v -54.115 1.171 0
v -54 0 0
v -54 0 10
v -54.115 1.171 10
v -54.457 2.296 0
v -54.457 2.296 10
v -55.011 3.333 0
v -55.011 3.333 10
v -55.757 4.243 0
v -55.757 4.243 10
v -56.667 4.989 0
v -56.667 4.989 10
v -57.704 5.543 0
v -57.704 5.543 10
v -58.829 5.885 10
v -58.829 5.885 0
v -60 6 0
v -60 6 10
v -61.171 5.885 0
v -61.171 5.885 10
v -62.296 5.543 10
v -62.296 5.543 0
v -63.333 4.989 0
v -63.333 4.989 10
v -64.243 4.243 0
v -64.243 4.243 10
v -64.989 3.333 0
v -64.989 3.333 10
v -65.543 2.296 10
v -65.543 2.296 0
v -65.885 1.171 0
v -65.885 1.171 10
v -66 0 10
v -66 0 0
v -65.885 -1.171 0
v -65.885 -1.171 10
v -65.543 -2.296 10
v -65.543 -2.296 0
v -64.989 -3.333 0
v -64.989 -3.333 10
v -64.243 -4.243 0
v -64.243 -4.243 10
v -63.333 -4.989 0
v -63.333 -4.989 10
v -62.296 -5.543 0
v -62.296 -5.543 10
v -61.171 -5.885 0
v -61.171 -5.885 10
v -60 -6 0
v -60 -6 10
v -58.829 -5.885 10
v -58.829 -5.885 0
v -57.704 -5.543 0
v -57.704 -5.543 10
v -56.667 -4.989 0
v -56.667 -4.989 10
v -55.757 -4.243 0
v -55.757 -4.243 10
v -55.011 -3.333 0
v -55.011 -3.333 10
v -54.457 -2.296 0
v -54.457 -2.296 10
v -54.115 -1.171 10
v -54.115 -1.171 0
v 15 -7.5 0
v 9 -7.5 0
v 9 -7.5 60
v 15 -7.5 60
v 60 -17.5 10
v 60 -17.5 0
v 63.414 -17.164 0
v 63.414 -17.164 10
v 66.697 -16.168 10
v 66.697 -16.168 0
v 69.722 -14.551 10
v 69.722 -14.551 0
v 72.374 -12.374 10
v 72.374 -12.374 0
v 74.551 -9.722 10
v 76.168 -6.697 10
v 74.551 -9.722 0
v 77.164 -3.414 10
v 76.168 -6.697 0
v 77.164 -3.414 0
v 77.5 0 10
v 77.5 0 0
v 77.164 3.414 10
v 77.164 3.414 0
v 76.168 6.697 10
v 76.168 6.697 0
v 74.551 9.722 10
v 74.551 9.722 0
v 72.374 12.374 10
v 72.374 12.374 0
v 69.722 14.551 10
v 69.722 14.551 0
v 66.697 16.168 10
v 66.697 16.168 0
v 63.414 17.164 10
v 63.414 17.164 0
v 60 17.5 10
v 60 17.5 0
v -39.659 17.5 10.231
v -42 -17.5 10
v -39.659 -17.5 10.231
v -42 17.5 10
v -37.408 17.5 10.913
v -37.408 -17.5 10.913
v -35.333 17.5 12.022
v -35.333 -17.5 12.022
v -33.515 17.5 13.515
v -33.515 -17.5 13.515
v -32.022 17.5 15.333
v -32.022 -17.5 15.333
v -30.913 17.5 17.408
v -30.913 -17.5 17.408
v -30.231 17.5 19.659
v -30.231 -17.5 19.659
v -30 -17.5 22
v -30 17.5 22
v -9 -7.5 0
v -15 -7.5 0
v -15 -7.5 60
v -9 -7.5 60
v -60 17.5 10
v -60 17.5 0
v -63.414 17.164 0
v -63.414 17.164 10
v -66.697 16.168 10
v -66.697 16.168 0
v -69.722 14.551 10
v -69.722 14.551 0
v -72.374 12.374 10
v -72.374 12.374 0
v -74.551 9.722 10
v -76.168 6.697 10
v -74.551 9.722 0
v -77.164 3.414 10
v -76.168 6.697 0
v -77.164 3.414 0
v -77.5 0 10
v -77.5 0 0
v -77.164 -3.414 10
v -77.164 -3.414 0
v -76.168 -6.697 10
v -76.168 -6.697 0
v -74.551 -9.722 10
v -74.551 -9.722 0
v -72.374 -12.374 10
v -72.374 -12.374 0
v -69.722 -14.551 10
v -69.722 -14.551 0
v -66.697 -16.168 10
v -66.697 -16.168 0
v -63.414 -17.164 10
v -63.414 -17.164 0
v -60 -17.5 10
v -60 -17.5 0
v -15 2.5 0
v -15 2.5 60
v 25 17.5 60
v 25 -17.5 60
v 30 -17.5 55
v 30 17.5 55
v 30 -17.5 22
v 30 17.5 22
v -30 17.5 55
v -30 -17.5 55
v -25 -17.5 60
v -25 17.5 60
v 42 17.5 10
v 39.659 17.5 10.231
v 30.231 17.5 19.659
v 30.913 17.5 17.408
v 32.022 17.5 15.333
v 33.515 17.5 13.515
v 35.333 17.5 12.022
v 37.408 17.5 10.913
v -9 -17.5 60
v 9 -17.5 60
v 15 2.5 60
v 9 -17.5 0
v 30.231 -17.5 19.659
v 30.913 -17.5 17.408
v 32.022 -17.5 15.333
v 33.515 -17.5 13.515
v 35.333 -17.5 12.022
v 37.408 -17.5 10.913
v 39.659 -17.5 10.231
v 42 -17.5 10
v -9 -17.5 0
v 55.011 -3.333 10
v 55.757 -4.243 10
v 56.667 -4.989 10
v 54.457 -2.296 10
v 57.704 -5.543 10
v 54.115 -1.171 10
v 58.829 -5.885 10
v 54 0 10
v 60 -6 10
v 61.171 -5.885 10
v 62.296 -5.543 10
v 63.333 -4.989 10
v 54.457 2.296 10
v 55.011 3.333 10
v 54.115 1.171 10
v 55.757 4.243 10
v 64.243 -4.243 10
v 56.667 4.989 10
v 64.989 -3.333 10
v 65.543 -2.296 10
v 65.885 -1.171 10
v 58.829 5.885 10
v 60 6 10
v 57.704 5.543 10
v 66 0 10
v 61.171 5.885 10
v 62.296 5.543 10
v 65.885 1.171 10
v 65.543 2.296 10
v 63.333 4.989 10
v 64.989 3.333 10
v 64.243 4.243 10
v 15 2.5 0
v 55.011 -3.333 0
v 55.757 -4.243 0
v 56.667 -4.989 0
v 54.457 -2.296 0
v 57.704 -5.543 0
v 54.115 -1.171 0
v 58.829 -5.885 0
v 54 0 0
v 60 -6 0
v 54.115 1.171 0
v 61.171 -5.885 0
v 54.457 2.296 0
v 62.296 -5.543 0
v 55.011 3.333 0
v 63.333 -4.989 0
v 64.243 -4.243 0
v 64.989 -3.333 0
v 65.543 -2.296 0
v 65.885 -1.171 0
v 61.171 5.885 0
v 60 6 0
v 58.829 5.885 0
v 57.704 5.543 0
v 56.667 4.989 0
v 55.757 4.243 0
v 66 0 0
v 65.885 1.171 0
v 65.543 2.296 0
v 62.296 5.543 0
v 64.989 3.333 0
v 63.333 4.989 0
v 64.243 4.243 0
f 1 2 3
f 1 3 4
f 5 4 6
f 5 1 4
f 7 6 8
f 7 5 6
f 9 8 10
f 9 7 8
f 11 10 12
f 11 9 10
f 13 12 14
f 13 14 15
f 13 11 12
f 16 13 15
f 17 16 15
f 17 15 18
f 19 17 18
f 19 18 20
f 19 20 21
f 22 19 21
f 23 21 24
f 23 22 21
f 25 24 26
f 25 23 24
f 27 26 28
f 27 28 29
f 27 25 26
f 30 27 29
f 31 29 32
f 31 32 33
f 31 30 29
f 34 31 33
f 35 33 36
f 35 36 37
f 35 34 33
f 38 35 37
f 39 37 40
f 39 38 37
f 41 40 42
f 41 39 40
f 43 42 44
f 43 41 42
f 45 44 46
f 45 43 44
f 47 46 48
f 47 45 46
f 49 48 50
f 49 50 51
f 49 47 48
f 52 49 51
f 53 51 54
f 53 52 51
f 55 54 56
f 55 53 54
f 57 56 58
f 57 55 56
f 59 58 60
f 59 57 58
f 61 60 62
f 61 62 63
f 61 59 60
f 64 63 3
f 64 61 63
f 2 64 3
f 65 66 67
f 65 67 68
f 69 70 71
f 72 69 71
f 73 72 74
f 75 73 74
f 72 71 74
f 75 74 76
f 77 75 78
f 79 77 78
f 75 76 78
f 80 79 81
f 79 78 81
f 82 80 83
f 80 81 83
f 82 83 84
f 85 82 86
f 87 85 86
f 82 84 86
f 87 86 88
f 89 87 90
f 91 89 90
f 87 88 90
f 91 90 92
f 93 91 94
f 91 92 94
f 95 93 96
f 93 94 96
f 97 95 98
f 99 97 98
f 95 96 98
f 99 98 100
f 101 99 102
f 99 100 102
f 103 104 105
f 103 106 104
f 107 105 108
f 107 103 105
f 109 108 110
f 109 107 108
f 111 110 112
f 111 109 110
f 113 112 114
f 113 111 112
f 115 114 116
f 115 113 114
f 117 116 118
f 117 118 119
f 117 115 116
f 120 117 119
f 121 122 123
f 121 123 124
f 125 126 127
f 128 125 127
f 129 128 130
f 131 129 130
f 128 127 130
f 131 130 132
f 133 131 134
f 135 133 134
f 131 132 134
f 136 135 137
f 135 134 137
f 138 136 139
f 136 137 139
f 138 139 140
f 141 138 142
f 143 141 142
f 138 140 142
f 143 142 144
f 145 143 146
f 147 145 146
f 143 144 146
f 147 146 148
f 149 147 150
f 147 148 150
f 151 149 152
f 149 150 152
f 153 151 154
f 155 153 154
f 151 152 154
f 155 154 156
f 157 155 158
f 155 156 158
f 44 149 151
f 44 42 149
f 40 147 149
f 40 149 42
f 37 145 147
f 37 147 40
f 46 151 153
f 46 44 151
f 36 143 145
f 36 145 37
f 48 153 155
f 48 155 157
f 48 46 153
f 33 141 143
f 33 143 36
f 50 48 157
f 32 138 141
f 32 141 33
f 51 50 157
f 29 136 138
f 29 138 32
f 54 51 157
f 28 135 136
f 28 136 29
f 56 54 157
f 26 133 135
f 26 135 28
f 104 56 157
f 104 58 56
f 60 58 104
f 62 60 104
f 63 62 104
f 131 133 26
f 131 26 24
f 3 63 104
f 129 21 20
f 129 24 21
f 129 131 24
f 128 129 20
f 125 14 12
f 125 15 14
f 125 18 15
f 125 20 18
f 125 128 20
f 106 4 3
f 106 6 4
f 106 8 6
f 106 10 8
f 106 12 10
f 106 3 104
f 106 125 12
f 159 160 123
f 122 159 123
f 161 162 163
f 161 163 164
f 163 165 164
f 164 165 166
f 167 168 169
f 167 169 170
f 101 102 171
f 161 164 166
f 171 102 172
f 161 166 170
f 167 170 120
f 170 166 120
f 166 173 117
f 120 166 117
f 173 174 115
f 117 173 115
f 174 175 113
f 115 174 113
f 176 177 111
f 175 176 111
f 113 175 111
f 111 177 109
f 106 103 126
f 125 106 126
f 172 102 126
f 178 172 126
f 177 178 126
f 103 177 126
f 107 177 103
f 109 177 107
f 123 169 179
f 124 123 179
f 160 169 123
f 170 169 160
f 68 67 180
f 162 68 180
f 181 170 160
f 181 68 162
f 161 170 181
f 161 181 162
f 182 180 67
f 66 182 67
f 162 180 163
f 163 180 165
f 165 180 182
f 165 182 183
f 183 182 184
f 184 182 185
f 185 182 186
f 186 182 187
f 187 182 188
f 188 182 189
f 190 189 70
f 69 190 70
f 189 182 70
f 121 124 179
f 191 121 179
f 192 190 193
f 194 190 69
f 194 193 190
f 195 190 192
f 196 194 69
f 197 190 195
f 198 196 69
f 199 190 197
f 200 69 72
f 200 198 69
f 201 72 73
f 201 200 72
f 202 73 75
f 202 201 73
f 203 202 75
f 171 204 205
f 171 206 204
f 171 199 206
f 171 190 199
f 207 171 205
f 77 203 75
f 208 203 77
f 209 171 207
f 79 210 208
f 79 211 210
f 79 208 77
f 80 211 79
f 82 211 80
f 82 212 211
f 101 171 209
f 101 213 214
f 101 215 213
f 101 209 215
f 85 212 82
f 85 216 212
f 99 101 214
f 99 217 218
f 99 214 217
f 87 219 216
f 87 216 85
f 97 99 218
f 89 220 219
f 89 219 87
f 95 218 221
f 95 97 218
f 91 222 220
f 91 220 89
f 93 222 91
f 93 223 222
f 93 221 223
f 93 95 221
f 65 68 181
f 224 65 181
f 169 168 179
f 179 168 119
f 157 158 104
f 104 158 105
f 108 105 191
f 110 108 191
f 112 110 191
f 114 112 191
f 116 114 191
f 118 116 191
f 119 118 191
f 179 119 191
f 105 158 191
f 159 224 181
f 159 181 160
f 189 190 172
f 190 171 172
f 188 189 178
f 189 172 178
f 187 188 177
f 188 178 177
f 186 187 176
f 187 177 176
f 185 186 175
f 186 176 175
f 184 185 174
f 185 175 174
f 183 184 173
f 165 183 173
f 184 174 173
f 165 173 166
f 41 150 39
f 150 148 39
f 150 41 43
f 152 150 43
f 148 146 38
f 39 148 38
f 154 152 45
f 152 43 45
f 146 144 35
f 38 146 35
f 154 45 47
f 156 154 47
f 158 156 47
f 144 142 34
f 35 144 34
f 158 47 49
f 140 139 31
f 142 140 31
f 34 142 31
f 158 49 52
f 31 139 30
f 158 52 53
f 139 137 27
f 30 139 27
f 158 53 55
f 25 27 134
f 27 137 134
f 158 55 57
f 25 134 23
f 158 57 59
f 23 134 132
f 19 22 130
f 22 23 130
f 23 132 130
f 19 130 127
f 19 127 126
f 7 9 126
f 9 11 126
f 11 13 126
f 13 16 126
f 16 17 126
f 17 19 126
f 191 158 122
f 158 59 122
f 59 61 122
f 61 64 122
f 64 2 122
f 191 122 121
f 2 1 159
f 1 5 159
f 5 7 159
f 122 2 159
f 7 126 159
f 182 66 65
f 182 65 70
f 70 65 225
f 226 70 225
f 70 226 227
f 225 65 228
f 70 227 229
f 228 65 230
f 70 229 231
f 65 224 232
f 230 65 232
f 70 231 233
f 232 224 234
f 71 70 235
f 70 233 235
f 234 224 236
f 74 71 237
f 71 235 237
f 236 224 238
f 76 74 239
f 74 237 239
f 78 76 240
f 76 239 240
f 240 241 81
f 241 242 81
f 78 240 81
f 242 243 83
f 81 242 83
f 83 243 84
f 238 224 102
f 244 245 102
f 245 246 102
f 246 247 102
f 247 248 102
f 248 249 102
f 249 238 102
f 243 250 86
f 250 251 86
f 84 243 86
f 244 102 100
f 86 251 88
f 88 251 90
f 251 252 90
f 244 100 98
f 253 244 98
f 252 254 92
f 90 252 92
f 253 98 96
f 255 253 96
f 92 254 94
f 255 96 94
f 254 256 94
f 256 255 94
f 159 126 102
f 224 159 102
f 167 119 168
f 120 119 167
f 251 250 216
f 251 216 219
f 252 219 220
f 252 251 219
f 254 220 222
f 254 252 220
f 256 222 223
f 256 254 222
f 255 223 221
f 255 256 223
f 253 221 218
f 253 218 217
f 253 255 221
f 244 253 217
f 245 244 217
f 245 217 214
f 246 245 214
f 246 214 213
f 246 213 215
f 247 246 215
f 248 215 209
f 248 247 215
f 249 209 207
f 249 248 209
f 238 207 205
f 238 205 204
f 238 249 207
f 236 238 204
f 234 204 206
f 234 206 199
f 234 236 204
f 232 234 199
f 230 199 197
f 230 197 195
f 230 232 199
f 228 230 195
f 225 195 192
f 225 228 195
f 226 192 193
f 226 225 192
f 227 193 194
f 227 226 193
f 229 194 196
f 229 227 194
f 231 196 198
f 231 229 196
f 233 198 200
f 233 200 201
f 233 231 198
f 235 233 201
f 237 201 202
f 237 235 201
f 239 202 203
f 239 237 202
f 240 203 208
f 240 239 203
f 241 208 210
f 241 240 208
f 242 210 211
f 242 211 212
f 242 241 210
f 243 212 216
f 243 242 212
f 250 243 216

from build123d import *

# Parameters (mm, degrees)
F0_R     = 6
F1_DEPTH = 10
F2_W     = 60
F2_H     = 35
F3_DEPTH = 50
F4_R     = 12
F5_SIZE2 = 5
F5_SIZE  = 5
F7_DEPTH = 60.001


with BuildPart() as f1:
    # F0 (on Top) → F1 (new body)
    with BuildSketch(Plane.XY):
        with BuildLine():
            Line((60, 17.5), (-60, 17.5))
            ThreePointArc((-60, 17.5), (-77.5, 0), (-60, -17.5))
            Line((-60, -17.5), (60, -17.5))
            ThreePointArc((60, -17.5), (77.5, 0), (60, 17.5))
        make_face()
        with Locations((-60, 0)):
            Circle(F0_R, mode=Mode.SUBTRACT)
        with Locations((60, 0)):
            Circle(F0_R, mode=Mode.SUBTRACT)
    extrude(amount=F1_DEPTH)

    # F2 (on face) → F3 (join)
    with BuildSketch(Plane.XY.offset(10)):
        Rectangle(F2_W, F2_H)
    extrude(amount=F3_DEPTH)

    # F4
    f4_edges = [f1.edges().sort_by_distance(p)[0] for p in [
        (30, 0, 10),
        (-30, 0, 10),
    ]]
    fillet(f4_edges, radius=F4_R)

    # F5
    f5_edges = [f1.edges().sort_by_distance(p)[0] for p in [
        (30, 0, 60),
        (-30, 0, 60),
    ]]
    chamfer(f5_edges, length=F5_SIZE, length2=F5_SIZE2)

    # F6 (on face) → F7 (cut, through all)
    with BuildSketch(Plane.XY.offset(60)):
        Polygon((-9, -7.5), (-9, -17.5), (9, -17.5), (9, -7.5), (15, -7.5), (15, 2.5), (-15, 2.5), (-15, -7.5), align=None)
    extrude(amount=-F7_DEPTH, mode=Mode.SUBTRACT)


solid = f1.part
